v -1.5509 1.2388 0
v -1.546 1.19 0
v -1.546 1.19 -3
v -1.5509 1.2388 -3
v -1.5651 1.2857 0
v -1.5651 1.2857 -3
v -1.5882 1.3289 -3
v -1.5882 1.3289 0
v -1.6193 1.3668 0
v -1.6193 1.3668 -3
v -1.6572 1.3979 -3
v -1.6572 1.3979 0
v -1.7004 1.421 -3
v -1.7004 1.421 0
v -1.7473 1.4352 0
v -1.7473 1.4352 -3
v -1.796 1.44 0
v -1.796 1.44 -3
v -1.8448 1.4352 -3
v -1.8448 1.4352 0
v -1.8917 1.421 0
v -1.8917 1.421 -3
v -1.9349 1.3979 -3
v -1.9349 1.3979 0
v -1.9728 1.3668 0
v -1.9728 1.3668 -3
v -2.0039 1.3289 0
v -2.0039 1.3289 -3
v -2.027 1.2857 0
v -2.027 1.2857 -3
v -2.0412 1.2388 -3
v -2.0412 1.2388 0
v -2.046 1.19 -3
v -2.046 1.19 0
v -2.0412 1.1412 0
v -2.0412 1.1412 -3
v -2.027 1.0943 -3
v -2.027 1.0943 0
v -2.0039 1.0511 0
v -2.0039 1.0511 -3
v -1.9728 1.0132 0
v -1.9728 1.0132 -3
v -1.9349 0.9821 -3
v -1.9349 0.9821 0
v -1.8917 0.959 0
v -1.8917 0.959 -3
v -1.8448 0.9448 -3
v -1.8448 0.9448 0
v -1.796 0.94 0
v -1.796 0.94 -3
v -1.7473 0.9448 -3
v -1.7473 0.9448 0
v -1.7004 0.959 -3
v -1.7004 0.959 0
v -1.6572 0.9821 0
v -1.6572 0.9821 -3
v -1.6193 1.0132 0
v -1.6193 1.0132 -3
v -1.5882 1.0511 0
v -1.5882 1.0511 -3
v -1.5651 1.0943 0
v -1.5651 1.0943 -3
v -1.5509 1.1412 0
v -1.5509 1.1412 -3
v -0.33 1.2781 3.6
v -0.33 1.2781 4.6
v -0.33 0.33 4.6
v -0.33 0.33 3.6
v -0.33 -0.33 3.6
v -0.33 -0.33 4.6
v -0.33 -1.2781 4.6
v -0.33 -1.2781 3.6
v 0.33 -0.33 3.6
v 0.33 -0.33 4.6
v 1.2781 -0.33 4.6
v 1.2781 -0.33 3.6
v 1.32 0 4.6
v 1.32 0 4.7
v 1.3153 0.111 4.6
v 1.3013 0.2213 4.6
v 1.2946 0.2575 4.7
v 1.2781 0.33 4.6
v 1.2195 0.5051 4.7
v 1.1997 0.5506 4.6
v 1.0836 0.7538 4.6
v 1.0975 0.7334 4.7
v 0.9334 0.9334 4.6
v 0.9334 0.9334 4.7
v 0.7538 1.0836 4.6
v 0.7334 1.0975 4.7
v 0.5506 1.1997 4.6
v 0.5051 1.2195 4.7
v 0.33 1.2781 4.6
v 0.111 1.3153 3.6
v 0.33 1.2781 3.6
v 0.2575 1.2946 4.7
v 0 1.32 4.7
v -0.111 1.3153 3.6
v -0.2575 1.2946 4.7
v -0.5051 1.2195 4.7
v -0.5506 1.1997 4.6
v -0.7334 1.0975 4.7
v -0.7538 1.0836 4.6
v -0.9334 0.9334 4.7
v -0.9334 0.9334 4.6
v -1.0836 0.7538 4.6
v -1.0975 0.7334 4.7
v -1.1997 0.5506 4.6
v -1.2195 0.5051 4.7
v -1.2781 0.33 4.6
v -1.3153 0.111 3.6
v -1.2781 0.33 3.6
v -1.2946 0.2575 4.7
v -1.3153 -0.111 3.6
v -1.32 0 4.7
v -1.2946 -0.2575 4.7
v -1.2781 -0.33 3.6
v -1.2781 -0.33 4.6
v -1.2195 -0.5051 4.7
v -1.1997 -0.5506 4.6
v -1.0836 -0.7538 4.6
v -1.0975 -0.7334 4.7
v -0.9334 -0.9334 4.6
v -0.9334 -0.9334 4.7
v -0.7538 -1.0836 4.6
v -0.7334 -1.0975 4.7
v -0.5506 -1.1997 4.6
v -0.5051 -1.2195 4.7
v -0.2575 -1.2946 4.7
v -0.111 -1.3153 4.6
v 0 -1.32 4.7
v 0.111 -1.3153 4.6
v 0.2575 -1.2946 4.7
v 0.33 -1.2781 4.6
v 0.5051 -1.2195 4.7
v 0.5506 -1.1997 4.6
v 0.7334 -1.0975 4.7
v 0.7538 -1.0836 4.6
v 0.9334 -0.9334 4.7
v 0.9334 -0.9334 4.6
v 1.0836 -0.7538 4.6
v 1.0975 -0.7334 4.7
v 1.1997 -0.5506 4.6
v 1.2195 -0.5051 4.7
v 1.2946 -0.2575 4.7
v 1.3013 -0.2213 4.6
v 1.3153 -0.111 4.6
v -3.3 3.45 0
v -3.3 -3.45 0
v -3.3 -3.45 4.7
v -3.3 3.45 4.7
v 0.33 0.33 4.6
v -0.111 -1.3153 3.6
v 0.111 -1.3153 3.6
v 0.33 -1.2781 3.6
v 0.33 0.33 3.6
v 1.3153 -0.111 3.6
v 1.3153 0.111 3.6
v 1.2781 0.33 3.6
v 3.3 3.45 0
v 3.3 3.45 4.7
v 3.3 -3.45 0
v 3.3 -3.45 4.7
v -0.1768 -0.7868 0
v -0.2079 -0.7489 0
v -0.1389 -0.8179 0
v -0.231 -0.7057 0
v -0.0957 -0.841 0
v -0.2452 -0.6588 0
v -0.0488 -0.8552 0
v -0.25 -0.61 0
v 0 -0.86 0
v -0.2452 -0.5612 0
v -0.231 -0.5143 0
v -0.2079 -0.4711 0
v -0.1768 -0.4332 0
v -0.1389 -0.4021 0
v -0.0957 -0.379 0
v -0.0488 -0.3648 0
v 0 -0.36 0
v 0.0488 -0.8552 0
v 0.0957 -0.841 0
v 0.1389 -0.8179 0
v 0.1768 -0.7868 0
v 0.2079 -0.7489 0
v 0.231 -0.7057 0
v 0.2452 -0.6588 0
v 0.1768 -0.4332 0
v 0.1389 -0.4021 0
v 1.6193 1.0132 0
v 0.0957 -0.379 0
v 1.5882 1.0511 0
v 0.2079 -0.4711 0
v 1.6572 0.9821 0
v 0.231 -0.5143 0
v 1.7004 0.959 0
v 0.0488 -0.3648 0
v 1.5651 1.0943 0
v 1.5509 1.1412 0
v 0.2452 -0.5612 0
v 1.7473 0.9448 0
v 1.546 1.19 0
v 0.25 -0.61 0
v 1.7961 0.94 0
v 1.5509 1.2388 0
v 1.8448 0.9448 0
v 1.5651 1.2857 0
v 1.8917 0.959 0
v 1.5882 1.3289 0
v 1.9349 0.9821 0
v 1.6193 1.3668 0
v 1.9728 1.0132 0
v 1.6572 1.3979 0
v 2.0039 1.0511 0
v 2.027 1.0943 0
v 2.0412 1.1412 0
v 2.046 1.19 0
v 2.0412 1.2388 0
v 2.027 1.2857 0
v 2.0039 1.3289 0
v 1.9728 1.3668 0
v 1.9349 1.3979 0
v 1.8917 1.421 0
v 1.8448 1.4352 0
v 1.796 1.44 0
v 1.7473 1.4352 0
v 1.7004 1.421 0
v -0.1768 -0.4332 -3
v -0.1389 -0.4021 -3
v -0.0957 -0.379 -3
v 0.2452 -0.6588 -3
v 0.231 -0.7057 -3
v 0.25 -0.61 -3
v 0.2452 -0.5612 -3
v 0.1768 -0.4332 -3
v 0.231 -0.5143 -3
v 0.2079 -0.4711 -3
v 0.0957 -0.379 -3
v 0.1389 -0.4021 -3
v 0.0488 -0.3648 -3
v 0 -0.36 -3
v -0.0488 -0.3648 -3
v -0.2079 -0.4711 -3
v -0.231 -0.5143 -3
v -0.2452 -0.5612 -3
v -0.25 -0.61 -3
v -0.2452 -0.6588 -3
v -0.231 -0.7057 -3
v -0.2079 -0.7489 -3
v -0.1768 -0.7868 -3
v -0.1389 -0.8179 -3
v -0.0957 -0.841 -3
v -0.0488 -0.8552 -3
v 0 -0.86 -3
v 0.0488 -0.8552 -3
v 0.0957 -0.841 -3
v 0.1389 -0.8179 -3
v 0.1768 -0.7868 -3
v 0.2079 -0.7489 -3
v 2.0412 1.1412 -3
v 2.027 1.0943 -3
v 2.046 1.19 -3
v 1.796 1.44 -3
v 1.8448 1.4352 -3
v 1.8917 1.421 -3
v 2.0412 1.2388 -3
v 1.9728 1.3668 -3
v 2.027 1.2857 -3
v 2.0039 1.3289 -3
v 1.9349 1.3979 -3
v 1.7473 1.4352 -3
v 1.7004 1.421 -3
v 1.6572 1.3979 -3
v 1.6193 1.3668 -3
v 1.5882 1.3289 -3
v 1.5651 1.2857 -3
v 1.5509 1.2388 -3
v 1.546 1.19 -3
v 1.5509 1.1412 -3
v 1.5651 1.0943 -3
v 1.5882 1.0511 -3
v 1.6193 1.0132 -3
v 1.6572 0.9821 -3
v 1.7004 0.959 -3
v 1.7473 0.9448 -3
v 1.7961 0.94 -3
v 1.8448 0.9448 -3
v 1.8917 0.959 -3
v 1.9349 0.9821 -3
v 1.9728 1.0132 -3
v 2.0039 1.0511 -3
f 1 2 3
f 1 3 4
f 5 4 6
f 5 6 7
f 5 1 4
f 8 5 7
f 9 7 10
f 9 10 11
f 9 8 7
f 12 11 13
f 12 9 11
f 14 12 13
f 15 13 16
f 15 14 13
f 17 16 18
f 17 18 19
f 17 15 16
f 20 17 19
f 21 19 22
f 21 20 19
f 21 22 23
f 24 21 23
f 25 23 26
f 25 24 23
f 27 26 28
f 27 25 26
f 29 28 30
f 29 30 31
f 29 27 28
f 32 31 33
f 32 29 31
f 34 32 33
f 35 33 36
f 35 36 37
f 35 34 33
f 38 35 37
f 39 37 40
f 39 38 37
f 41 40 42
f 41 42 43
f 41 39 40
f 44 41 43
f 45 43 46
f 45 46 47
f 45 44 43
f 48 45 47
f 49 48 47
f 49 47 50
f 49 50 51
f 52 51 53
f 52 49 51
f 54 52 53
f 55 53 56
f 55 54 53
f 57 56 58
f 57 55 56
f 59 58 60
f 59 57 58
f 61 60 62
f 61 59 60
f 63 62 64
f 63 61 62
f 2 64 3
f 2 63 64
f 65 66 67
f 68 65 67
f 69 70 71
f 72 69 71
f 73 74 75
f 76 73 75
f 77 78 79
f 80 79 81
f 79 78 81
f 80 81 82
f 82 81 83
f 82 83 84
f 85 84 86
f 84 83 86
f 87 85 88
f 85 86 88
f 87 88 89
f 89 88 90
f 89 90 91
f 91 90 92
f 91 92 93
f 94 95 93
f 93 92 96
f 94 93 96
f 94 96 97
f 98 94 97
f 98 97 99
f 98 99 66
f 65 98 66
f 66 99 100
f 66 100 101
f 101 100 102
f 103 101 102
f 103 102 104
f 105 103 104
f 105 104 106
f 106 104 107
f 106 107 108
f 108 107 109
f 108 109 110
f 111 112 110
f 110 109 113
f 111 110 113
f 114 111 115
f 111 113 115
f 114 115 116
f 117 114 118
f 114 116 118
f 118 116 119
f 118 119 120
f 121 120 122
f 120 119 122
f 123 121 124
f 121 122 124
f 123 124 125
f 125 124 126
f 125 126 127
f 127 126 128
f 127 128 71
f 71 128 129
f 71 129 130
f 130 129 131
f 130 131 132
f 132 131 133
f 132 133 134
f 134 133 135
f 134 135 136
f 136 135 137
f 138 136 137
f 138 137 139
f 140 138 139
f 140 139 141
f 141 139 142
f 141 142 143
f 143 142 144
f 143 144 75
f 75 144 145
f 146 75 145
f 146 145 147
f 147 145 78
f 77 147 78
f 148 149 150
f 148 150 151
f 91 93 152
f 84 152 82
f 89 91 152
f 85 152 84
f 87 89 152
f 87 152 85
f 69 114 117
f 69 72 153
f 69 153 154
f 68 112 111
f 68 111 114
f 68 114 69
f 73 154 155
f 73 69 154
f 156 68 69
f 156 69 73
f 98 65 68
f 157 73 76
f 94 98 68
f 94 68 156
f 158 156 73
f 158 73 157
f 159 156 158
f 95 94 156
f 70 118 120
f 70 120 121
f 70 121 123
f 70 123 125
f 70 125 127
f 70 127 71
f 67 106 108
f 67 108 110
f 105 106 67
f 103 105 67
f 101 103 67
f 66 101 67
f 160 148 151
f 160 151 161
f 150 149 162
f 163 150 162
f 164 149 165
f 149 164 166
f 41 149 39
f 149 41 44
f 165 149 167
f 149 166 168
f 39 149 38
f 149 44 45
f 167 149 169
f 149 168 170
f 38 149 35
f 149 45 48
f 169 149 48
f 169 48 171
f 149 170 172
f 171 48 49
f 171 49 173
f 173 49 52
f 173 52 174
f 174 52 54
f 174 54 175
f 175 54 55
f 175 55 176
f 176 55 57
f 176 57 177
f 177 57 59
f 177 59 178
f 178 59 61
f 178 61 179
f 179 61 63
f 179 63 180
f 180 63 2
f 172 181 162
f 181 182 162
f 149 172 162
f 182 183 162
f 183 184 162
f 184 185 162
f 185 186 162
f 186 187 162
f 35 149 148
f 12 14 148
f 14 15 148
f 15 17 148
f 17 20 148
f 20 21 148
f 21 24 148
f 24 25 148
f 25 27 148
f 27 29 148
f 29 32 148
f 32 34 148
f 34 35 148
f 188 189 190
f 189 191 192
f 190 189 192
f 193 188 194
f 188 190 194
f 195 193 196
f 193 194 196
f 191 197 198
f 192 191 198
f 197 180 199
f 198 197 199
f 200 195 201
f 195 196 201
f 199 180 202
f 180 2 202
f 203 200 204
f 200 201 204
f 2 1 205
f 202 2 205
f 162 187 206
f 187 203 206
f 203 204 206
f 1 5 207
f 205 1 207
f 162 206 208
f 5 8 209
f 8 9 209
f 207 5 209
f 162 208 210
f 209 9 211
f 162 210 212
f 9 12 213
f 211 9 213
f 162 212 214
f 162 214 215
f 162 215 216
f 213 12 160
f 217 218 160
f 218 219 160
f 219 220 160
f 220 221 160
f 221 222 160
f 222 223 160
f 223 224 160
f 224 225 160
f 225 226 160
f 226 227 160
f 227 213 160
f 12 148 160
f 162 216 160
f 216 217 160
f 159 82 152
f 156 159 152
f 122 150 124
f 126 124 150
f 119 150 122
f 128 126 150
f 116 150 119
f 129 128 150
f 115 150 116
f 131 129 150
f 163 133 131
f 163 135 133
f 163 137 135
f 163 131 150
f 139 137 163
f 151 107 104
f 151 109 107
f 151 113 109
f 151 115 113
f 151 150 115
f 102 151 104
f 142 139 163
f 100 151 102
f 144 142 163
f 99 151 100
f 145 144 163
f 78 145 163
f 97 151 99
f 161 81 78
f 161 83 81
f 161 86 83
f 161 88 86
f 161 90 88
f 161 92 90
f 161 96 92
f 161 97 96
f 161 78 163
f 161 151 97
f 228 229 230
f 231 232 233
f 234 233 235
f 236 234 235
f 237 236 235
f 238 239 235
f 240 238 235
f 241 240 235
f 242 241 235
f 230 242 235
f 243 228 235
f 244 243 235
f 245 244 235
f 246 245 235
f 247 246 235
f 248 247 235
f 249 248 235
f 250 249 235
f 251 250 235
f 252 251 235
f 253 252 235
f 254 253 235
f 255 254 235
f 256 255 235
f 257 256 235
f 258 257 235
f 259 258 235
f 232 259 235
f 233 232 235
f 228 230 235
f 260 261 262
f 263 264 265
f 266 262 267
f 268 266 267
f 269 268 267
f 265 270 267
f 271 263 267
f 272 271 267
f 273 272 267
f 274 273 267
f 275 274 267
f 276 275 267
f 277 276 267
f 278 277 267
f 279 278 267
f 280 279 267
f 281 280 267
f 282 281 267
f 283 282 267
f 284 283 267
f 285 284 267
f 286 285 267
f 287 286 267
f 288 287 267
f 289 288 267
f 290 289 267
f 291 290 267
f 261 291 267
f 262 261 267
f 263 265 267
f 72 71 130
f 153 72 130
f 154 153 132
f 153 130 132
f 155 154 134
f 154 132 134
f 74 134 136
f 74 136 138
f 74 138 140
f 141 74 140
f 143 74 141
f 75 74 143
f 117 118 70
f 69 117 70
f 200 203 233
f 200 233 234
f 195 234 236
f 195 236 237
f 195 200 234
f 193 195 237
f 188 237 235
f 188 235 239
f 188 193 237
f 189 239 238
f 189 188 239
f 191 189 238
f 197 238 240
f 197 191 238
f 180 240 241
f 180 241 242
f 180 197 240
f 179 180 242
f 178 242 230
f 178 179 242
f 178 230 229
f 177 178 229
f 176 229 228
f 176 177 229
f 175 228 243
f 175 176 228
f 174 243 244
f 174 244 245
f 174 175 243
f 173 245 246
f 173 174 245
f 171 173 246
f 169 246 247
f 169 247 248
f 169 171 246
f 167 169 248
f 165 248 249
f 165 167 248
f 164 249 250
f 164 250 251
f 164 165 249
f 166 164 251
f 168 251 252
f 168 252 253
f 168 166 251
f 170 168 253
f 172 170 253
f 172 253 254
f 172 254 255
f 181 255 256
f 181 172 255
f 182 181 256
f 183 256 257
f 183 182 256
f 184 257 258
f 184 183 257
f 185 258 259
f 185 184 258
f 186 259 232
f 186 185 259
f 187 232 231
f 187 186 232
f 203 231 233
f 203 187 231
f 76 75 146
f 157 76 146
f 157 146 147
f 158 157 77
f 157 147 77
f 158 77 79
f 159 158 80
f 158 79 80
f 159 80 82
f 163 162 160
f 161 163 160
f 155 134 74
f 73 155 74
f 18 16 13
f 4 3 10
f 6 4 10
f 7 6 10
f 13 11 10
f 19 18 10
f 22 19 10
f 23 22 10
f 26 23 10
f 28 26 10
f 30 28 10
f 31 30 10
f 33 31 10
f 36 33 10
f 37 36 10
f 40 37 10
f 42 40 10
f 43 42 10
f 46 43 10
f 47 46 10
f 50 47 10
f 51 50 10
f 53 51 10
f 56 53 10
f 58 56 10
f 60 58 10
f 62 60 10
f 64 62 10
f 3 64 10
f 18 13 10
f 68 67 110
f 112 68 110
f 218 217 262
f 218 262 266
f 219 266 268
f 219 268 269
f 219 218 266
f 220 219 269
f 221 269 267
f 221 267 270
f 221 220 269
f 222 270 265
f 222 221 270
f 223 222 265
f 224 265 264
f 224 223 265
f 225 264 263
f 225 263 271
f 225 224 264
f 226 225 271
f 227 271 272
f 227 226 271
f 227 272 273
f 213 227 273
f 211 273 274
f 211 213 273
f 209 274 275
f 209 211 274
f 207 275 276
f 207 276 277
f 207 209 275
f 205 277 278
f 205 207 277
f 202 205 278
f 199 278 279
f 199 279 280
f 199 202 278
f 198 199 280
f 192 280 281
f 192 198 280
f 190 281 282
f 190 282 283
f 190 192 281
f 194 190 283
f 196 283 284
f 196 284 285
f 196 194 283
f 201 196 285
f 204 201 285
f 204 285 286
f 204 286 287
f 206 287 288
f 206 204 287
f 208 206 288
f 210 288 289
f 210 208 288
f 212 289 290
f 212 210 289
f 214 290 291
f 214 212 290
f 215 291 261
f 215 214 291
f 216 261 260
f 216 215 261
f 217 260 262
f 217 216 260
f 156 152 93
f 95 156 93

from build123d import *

# Parameters (mm, degrees)
SKETCH_1_W          = 6.6
SKETCH_1_H          = 6.9
EXTRUDE_1_DEPTH     = 4.7
SKETCH_2_R          = 1.32
CUT_EXTRUDE_1_DEPTH = 0.1
CUT_EXTRUDE_2_DEPTH = 1
SKETCH_4_R          = 0.25
EXTRUDE_2_DEPTH     = 3


with BuildPart() as part:
    # Эскиз1 → Бобышка-Вытянуть1 (new body)
    with BuildSketch(Plane.XY):
        Rectangle(SKETCH_1_W, SKETCH_1_H)
    extrude(amount=EXTRUDE_1_DEPTH)

    # Эскиз2 → Вырез-Вытянуть1 (cut)
    with BuildSketch(Plane.XY.offset(4.7)):
        Circle(SKETCH_2_R)
    extrude(amount=-CUT_EXTRUDE_1_DEPTH, mode=Mode.SUBTRACT)

    # Эскиз3 → Вырез-Вытянуть2 (cut)
    with BuildSketch(Plane.XY.offset(4.6)):
        with BuildLine():
            Line((-0.33, 1.278084504), (-0.33, 0.33))
            Line((-0.33, 0.33), (-1.278084504, 0.33))
            ThreePointArc((-1.278084504, 0.33), (-1.32, 0), (-1.278084504, -0.33))
            Line((-1.278084504, -0.33), (-0.33, -0.33))
            Line((-0.33, -0.33), (-0.33, -1.278084504))
            ThreePointArc((-0.33, -1.278084504), (0, -1.32), (0.33, -1.278084504))
            Line((0.33, -1.278084504), (0.33, -0.33))
            Line((0.33, -0.33), (1.278084504, -0.33))
            ThreePointArc((1.278084504, -0.33), (1.32, 0), (1.278084504, 0.33))
            Line((1.278084504, 0.33), (0.33, 0.33))
            Line((0.33, 0.33), (0.33, 1.278084504))
            ThreePointArc((0.33, 1.278084504), (0, 1.32), (-0.33, 1.278084504))
        make_face()
    extrude(amount=-CUT_EXTRUDE_2_DEPTH, mode=Mode.SUBTRACT)

    # Эскиз4 → Бобышка-Вытянуть2 (add)
    with BuildSketch(Plane.XY):
        with Locations((1.79605, 1.19)):
            Circle(SKETCH_4_R)
        with Locations((-1.79605, 1.19)):
            Circle(SKETCH_4_R)
        with Locations((0, -0.61)):
            Circle(SKETCH_4_R)
    extrude(amount=-EXTRUDE_2_DEPTH)


solid = part.part
